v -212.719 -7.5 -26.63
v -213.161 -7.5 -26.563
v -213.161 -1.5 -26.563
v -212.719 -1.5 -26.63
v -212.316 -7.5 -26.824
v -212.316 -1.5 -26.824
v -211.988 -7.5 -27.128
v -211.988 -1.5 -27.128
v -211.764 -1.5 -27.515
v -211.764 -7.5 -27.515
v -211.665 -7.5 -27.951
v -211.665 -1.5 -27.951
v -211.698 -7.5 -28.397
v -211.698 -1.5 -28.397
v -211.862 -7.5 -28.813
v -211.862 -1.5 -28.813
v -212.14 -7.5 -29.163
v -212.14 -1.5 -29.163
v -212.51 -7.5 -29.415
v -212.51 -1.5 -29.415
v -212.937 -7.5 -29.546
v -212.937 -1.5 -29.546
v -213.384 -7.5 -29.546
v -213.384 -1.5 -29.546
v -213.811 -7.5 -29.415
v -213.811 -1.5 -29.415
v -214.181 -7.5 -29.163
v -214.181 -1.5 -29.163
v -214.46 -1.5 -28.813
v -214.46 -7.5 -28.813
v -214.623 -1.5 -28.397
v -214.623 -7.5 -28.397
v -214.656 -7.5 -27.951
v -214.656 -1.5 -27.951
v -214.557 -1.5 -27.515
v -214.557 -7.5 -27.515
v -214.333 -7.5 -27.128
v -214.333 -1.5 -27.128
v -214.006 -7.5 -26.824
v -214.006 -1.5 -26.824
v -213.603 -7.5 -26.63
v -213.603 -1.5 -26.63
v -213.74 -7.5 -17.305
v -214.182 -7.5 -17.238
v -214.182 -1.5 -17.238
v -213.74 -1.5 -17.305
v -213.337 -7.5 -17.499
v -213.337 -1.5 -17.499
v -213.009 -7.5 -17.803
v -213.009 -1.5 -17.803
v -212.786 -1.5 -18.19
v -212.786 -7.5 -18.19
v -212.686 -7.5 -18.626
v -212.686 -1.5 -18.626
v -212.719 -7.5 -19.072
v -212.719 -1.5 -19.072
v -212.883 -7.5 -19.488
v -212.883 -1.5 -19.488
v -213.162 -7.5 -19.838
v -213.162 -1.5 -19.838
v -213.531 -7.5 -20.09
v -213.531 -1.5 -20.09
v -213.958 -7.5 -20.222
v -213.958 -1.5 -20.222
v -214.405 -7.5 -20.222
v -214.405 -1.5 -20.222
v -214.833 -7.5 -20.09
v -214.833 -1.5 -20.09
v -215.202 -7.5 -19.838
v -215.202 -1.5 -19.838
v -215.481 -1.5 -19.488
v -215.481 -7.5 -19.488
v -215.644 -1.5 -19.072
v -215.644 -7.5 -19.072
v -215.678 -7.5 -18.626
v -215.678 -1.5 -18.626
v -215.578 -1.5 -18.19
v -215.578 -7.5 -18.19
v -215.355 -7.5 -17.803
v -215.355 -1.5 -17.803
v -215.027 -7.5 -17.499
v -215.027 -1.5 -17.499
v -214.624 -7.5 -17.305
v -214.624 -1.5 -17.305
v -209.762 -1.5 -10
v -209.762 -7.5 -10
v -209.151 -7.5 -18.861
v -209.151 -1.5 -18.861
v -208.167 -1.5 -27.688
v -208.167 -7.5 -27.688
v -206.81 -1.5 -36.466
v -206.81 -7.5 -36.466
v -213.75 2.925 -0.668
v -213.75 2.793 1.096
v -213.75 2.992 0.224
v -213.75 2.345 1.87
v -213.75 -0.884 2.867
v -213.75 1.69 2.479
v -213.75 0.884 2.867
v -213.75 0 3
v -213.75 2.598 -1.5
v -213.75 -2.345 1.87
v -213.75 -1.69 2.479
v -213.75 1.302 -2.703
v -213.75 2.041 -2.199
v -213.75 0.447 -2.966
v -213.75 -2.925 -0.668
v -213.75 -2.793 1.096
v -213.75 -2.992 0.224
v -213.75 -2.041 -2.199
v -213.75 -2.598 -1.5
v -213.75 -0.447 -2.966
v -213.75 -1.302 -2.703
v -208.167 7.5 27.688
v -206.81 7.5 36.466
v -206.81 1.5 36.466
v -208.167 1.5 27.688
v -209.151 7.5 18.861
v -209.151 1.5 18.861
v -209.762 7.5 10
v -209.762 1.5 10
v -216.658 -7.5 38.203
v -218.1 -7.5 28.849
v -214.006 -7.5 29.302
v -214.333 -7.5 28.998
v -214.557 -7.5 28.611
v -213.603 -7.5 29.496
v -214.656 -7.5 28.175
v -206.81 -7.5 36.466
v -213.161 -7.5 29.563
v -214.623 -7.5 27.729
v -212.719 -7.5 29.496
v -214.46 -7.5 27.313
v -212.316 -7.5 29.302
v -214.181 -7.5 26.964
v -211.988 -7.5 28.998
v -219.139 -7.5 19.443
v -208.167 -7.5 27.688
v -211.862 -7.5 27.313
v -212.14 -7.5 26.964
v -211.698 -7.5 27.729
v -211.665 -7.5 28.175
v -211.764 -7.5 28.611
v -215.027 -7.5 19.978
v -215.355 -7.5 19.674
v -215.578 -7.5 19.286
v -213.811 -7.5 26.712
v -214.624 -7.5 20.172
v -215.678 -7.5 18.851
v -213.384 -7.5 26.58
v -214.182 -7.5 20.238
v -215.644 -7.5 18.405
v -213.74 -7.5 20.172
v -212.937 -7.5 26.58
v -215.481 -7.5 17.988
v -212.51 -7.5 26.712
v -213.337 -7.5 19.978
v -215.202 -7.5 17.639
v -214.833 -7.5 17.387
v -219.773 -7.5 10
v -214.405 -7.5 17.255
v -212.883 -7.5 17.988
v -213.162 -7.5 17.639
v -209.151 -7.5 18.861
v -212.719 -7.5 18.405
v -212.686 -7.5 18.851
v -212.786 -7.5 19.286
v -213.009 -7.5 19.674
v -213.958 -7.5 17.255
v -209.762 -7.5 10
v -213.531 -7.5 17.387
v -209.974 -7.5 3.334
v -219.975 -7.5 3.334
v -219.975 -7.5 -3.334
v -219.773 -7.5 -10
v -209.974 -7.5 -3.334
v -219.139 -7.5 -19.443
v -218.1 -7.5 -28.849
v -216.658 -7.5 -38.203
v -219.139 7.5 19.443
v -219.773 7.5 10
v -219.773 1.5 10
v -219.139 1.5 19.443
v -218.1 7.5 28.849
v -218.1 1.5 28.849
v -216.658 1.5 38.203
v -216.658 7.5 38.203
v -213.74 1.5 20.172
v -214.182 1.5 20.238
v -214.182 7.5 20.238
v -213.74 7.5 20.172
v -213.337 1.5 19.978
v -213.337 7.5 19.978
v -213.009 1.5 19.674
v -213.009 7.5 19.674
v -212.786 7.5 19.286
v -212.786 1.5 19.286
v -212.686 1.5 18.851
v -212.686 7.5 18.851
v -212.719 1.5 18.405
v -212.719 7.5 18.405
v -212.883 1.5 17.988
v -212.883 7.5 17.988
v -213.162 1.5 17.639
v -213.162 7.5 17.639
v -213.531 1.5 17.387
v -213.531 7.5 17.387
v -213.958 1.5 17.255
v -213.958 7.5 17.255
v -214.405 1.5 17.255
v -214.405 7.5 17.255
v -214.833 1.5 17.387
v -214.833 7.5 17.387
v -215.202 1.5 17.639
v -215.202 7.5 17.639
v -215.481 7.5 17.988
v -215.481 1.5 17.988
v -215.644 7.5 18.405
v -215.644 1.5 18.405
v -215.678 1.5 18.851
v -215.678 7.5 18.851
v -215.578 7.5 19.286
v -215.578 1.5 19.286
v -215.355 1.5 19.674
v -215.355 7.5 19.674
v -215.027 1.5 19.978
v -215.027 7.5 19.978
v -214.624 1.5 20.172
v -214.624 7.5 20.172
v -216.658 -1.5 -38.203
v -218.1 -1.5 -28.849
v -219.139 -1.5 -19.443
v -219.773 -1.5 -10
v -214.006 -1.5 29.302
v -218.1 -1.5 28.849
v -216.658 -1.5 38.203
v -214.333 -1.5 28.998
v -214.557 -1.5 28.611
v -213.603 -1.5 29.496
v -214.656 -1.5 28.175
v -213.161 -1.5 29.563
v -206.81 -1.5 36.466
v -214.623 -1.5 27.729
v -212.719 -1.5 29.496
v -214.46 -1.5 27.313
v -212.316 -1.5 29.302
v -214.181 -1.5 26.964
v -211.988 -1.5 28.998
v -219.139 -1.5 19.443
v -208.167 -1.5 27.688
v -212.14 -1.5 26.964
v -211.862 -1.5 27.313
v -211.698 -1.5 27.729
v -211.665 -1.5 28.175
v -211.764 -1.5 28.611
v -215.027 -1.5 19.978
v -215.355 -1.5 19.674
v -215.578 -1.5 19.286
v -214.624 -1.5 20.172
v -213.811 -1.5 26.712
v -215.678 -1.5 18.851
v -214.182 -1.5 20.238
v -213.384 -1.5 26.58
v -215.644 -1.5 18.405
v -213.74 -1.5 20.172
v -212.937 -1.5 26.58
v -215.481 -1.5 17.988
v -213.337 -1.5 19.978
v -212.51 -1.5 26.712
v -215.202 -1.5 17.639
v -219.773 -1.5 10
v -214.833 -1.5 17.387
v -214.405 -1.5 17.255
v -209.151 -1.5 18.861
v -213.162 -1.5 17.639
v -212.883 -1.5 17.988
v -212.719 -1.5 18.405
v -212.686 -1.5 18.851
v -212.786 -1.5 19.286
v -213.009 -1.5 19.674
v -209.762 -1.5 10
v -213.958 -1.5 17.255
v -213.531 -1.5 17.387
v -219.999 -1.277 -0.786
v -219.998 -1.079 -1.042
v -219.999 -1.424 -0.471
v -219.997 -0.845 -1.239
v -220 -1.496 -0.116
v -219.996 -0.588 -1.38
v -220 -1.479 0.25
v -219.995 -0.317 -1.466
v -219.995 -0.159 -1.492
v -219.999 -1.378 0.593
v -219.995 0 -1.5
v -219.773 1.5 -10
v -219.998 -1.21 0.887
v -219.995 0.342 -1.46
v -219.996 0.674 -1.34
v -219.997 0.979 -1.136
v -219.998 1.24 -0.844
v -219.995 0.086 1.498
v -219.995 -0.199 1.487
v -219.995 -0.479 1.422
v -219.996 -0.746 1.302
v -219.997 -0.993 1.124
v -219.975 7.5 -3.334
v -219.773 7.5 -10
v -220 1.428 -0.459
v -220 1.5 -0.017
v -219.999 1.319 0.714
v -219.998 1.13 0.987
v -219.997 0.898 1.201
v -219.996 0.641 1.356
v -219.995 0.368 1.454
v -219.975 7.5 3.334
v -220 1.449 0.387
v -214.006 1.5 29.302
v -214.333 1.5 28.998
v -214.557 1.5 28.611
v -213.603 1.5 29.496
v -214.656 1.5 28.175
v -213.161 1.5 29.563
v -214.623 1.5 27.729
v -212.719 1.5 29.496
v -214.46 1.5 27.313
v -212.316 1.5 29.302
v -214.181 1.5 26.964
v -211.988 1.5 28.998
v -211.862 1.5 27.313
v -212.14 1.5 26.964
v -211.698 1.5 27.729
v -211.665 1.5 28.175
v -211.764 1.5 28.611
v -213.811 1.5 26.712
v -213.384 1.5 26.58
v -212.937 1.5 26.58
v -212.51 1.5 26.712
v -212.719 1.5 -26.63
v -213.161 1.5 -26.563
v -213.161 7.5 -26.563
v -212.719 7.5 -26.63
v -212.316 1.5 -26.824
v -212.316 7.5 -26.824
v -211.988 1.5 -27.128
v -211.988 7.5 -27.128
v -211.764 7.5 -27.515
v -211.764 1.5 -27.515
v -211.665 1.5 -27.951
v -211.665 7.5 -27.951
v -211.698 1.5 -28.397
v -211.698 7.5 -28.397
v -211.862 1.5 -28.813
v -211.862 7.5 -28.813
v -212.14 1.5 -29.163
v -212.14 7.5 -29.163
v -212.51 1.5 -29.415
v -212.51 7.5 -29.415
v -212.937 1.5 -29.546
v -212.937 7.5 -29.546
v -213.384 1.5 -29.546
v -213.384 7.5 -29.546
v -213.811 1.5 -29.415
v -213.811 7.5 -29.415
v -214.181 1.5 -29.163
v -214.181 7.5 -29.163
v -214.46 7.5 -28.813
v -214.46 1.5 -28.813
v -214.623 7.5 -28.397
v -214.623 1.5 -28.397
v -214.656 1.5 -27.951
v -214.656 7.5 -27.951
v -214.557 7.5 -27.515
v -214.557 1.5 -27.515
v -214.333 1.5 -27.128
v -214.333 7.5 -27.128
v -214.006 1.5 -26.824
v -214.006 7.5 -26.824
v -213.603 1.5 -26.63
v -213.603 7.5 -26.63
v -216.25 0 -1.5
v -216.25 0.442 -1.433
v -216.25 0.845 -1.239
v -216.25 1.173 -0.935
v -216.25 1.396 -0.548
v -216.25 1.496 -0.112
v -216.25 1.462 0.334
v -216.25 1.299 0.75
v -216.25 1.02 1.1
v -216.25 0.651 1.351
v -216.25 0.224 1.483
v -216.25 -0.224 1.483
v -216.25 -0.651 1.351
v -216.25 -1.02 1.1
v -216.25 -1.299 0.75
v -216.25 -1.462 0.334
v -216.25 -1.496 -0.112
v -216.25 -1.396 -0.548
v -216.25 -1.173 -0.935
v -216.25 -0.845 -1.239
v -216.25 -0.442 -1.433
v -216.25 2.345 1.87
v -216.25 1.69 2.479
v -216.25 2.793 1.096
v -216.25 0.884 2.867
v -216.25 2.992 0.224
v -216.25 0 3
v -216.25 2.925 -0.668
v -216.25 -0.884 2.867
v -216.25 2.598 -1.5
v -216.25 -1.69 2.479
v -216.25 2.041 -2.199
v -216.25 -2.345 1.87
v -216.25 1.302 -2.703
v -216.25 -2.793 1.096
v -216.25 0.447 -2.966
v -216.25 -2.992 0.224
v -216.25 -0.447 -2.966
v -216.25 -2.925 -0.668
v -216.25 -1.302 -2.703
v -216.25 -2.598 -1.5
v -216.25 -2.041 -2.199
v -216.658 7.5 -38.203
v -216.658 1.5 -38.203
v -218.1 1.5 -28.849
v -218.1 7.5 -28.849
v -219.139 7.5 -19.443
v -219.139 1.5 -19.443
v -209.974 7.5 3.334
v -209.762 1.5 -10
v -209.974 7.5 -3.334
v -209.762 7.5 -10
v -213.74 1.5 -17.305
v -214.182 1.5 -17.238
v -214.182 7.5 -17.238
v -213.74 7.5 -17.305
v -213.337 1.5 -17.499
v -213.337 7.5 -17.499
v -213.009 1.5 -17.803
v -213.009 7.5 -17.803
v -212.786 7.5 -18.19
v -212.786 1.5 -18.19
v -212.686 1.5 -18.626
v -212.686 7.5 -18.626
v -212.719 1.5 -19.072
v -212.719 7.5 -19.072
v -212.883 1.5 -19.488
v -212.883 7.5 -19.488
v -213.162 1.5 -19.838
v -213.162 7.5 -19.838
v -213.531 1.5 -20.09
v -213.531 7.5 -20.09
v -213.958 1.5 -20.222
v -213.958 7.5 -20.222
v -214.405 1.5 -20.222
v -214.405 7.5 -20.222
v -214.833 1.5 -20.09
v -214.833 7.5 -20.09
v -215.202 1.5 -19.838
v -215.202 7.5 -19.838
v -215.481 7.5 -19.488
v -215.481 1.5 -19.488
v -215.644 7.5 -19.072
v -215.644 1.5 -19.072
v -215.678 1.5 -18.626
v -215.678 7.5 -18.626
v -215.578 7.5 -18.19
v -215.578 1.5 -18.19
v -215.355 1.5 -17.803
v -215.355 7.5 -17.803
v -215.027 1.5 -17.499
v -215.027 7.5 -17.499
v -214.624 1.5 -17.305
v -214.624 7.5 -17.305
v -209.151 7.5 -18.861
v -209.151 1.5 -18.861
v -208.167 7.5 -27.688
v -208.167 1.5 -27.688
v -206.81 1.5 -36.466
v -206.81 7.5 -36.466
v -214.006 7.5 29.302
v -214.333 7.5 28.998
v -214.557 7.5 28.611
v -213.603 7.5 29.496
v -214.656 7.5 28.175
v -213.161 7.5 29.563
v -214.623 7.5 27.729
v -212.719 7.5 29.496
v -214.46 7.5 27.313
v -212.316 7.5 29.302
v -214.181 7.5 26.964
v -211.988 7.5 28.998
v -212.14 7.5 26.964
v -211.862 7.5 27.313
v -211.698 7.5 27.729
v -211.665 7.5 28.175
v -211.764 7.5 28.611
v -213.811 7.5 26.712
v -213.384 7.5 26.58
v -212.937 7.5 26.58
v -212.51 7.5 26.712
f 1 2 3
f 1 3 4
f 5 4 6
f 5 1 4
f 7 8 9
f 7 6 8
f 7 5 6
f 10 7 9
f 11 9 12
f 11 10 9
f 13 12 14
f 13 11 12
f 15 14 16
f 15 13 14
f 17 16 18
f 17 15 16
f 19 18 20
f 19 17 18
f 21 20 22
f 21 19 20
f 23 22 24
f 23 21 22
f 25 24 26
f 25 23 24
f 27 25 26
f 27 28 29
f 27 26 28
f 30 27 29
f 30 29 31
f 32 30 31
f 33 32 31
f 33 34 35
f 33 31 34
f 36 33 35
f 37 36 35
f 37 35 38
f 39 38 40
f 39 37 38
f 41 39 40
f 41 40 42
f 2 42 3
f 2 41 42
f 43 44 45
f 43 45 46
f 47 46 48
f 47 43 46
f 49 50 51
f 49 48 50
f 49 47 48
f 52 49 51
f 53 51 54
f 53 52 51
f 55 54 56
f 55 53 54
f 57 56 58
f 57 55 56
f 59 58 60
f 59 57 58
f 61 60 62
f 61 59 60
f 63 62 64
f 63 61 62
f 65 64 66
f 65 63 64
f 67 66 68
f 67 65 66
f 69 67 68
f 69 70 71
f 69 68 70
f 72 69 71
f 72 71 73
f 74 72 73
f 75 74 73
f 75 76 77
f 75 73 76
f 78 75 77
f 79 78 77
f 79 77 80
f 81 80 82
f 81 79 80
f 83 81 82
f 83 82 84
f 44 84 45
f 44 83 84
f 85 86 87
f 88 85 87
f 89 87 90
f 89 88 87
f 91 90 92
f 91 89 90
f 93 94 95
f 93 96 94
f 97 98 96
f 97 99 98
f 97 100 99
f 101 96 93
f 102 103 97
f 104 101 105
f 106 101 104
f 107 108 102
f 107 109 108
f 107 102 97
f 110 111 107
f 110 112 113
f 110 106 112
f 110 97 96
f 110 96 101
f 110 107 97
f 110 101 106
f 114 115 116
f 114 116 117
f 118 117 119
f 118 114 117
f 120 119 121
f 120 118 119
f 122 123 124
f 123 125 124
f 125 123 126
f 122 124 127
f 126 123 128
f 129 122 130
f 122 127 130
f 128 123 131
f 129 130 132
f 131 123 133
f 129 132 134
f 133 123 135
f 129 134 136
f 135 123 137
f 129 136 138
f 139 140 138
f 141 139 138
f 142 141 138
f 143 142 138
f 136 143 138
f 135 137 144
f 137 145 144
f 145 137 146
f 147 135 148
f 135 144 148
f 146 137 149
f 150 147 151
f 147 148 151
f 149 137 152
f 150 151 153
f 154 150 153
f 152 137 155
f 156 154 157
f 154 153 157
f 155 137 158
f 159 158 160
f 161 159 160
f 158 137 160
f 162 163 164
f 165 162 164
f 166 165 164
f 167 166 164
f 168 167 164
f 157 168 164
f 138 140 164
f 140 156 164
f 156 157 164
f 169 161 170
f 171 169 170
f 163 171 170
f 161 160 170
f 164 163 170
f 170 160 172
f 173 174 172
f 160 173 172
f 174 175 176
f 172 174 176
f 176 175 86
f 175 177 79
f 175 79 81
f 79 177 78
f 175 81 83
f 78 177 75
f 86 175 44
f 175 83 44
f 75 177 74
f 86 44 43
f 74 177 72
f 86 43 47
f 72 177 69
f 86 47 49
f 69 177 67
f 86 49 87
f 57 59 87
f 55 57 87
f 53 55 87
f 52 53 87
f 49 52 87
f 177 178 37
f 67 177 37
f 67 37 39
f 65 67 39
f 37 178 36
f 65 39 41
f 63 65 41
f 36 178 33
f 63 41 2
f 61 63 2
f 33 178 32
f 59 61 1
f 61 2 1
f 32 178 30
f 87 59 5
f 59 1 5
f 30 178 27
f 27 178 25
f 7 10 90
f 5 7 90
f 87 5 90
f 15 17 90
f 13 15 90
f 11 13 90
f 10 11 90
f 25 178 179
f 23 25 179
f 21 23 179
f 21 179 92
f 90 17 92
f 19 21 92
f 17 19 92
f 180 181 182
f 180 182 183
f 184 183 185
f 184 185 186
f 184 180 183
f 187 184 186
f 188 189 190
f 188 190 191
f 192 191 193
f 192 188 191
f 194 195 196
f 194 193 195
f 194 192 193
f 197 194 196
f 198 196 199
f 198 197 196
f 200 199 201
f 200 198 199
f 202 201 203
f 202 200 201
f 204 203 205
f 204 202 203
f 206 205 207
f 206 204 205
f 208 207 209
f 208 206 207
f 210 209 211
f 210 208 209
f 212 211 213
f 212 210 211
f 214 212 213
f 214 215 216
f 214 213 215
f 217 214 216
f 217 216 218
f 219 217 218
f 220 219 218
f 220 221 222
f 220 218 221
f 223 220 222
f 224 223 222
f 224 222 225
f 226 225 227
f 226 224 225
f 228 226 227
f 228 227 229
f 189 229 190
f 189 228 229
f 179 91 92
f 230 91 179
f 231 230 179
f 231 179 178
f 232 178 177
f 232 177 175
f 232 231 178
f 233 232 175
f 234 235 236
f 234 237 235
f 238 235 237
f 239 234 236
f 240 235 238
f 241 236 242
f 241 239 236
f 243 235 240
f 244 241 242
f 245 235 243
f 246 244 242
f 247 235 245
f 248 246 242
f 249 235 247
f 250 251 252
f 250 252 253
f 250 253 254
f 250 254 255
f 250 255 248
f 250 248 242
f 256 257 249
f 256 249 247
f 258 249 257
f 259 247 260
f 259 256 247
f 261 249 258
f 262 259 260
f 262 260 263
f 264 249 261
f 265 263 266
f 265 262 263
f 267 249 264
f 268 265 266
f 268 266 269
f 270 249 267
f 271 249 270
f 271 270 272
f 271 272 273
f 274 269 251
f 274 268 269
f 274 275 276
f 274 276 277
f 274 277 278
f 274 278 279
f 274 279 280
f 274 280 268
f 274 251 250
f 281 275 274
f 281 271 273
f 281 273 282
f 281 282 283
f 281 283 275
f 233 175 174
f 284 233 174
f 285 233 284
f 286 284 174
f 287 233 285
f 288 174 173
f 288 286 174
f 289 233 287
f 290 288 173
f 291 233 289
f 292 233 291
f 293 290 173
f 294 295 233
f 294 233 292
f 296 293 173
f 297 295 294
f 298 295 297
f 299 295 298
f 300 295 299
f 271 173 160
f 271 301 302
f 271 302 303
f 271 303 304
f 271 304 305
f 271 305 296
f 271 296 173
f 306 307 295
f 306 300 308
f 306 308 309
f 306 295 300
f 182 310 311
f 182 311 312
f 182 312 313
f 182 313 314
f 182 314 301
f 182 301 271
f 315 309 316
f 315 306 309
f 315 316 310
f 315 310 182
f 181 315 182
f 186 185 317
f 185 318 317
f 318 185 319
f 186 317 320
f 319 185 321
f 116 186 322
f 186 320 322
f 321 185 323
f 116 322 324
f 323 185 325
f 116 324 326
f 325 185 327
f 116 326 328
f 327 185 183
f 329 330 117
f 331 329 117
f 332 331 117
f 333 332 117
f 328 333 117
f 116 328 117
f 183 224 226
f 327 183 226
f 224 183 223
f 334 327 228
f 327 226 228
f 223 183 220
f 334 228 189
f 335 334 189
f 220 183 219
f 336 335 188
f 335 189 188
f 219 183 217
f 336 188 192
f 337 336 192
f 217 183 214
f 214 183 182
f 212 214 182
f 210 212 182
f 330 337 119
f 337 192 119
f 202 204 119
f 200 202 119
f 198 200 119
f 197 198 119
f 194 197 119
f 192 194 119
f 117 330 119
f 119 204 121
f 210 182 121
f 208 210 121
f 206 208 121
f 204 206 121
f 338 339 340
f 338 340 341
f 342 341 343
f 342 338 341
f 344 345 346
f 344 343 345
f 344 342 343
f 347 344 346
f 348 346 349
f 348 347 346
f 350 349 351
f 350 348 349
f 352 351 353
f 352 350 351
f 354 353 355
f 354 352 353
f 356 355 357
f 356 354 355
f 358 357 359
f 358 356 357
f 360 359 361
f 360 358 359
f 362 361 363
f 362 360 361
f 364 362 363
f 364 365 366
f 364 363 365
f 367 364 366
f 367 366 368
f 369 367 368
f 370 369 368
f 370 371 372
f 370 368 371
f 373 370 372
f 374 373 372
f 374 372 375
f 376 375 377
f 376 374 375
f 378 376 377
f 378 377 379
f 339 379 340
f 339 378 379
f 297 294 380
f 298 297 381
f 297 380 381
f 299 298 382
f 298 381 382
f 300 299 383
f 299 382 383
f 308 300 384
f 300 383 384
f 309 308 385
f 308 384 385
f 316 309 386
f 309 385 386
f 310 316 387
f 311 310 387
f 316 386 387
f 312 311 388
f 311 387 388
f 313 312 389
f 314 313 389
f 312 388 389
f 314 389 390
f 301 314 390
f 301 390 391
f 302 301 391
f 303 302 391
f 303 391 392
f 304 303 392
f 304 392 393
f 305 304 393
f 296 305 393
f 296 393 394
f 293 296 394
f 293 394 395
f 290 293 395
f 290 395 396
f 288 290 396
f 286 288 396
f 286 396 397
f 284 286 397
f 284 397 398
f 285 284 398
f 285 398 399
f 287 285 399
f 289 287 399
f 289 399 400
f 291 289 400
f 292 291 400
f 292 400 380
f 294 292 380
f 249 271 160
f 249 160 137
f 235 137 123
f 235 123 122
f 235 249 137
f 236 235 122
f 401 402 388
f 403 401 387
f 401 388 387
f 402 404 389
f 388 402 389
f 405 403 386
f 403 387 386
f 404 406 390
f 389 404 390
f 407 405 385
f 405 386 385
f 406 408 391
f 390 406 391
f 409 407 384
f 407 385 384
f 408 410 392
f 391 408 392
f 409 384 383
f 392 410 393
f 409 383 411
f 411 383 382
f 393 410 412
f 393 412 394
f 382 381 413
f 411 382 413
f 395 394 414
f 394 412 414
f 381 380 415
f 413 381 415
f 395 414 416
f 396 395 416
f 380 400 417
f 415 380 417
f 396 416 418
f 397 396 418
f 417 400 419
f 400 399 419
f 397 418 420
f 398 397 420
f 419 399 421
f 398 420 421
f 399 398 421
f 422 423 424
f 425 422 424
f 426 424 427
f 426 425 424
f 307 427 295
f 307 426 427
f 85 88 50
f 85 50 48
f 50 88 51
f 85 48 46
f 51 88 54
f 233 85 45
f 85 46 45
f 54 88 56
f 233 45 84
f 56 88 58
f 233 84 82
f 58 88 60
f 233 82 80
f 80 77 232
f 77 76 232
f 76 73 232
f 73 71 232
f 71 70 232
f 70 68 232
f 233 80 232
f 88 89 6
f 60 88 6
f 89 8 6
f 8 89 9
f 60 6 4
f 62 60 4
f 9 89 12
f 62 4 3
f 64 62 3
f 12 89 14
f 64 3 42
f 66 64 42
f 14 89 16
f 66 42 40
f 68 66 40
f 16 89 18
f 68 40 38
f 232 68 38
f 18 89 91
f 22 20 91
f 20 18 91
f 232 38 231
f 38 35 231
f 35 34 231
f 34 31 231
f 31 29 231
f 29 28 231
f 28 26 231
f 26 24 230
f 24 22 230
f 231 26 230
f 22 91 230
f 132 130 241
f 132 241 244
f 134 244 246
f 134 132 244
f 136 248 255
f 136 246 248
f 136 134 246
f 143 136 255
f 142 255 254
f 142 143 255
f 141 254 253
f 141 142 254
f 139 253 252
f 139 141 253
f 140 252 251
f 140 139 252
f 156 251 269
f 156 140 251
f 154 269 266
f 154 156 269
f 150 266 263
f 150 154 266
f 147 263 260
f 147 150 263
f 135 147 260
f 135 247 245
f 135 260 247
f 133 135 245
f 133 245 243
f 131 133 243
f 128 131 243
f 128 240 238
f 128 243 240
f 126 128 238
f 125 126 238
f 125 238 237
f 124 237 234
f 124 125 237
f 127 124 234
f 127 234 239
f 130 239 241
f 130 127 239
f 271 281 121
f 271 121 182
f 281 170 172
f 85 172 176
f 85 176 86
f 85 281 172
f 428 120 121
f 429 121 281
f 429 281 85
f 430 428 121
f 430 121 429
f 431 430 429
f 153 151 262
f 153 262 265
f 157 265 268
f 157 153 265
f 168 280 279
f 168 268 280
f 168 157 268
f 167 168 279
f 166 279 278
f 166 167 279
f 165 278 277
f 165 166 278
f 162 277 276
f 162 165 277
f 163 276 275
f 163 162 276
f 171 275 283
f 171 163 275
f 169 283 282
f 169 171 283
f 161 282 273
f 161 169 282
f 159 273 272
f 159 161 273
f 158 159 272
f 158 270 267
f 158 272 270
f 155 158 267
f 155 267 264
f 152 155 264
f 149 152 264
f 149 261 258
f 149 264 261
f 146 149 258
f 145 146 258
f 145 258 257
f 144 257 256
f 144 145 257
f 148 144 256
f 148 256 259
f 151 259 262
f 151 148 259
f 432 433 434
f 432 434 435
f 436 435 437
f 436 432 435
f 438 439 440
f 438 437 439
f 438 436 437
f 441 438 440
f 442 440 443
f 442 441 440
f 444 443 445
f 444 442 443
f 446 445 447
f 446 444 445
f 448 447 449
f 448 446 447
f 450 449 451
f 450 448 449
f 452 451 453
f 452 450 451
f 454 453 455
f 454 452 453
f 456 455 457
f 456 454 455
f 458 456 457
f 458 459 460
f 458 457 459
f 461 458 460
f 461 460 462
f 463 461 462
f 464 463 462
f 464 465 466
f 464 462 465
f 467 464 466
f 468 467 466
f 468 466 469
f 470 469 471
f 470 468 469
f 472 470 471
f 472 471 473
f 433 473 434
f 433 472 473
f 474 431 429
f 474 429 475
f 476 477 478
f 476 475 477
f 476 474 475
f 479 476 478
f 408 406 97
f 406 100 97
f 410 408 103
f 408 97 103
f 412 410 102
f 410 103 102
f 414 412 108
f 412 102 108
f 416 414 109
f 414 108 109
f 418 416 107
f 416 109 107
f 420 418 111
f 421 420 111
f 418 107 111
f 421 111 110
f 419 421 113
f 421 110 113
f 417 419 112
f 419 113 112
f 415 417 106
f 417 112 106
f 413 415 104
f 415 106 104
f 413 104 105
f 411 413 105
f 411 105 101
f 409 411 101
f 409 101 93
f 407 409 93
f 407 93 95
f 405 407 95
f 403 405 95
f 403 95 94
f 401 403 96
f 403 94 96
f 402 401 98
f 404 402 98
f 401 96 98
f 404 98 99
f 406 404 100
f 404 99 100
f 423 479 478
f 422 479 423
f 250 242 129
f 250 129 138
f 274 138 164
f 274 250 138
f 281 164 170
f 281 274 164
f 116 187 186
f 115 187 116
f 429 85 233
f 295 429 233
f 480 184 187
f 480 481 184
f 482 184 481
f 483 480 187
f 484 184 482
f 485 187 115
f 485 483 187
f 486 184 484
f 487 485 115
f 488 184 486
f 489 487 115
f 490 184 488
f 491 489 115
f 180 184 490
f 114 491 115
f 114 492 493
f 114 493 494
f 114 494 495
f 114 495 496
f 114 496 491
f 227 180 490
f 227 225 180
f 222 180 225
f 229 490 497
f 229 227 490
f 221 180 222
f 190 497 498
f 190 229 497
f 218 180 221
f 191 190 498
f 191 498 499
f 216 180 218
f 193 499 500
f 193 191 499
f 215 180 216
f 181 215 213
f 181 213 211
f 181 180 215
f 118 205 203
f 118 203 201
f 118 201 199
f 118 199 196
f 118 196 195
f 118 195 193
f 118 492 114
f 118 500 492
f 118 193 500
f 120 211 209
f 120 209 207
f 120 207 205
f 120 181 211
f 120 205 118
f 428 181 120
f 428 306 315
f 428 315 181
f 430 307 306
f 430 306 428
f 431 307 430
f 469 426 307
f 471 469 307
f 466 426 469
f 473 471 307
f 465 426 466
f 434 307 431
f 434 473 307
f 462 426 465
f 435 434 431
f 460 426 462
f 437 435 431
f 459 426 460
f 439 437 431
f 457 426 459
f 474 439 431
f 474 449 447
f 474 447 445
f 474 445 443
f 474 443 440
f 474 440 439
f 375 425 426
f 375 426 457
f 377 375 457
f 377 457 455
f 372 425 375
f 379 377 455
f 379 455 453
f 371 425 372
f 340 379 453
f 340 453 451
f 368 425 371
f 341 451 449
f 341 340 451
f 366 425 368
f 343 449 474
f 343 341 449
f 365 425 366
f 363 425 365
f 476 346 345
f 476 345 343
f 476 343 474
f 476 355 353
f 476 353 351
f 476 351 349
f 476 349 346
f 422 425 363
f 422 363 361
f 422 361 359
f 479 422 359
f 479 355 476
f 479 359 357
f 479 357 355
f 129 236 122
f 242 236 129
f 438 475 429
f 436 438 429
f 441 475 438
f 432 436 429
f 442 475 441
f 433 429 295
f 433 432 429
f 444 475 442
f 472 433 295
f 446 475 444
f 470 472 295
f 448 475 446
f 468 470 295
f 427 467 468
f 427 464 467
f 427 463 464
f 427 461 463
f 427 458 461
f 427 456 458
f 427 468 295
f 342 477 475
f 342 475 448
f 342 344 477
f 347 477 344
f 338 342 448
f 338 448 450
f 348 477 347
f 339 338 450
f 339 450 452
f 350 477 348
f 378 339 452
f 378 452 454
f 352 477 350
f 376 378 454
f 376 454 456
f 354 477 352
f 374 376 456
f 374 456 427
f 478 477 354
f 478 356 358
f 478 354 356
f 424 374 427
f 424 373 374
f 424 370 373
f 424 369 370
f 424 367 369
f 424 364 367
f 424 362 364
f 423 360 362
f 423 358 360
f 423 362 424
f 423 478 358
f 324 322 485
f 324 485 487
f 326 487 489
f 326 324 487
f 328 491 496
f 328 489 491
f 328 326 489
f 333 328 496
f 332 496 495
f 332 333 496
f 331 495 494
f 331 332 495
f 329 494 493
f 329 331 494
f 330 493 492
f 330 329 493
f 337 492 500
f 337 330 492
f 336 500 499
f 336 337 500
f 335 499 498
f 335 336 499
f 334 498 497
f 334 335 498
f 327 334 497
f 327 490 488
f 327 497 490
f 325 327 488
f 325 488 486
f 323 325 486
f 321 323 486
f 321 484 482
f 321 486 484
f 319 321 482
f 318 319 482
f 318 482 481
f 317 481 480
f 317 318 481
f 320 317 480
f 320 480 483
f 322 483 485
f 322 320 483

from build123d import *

# Parameters (mm, degrees)
BASE2_DEPTH            = 7.5
MOUNT2_START           = -1.5
MOUNT2_DEPTH           = 3
MOUNT_HOLE2_DEPTH      = 224.418192135
MOUNT_HOLE2_DEPTH_BACK = 224.418192135
SKETCH16_R             = 1.5
SKETCH18_W             = 2.5
SKETCH18_H             = 3
SKETCH19_R             = 1.5
CUT_EXTRUDE10_DEPTH    = 40.784051683


with BuildPart() as part:
    # Sketch13 → base2 (new, symmetric)
    with BuildSketch(Plane(origin=(0, 0, 0), x_dir=(1, 0, 0), z_dir=(0, 1, 0))):
        with BuildLine():
            ThreePointArc((-209.761769634, 10), (-208.70564487, 23.279901188), (-206.809628133, 36.46611731))
            Line((-206.809628133, 36.46611731), (-216.657705663, 38.202599087))
            ThreePointArc((-216.657705663, 38.202599087), (-218.670303662, 24.151569236), (-219.772609758, 10))
            Line((-219.772609758, 10), (-209.761769634, 10))
        make_face()
        with BuildLine():
            ThreePointArc((-209.761769634, -10), (-210, 0), (-209.761769634, 10))
            Line((-209.761769634, 10), (-219.772609758, 10))
            ThreePointArc((-219.772609758, 10), (-220, 0), (-219.772609758, -10))
            Line((-219.772609758, -10), (-209.761769634, -10))
        make_face()
        with BuildLine():
            Line((-216.657705663, -38.202599087), (-206.809628133, -36.46611731))
            ThreePointArc((-206.809628133, -36.46611731), (-208.70564487, -23.279901188), (-209.761769634, -10))
            Line((-209.761769634, -10), (-219.772609758, -10))
            ThreePointArc((-219.772609758, -10), (-218.670303662, -24.151569236), (-216.657705663, -38.202599087))
        make_face()
    extrude(amount=BASE2_DEPTH, both=True)

    # Sketch14 → mount2 (cut)
    with BuildSketch(Plane(origin=(0, 0, 0), x_dir=(1, 0, 0), z_dir=(0, 1, 0)).offset(MOUNT2_START)):
        with BuildLine():
            Line((-209.761769634, -10), (-219.772609758, -10))
            ThreePointArc((-219.772609758, -10), (-218.670303662, -24.151569236), (-216.657705663, -38.202599087))
            Line((-216.657705663, -38.202599087), (-206.809628133, -36.46611731))
            ThreePointArc((-206.809628133, -36.46611731), (-208.70564487, -23.279901188), (-209.761769634, -10))
        make_face()
        with BuildLine():
            Line((-209.761769634, 10), (-219.772609758, 10))
            ThreePointArc((-219.772609758, 10), (-218.670303662, 24.151569236), (-216.657705663, 38.202599087))
            Line((-216.657705663, 38.202599087), (-206.809628133, 36.46611731))
            ThreePointArc((-206.809628133, 36.46611731), (-208.70564487, 23.279901188), (-209.761769634, 10))
        make_face()
    extrude(amount=MOUNT2_DEPTH, mode=Mode.SUBTRACT)

    # Sketch16 → mount hole2 (cut, two sides: drawn at the far end of the back side and taken through both)
    with BuildSketch(Plane(origin=(0, 0, 0), x_dir=(1, 0, 0), z_dir=(0, 1, 0)).offset(-MOUNT_HOLE2_DEPTH_BACK)):
        with Locations(Location((-213.160645195, 28.063131327, 0), (0, 0, 270))):
            Circle(SKETCH16_R)
        with Locations(Location((-214.18186009, 18.738484691, 0), (0, 0, 270))):
            Circle(SKETCH16_R)
        with Locations(Location((-214.18186009, -18.738484691, 0), (0, 0, 270))):
            Circle(SKETCH16_R)
        with Locations(Location((-213.160645195, -28.063131327, 0), (0, 0, 270))):
            Circle(SKETCH16_R)
    extrude(amount=MOUNT_HOLE2_DEPTH + MOUNT_HOLE2_DEPTH_BACK, mode=Mode.SUBTRACT)

    # Sketch18 → bearing (revolve, cut)
    with BuildSketch(Plane(origin=(0, 0, 0), x_dir=(1, 0, 0), z_dir=(0, 1, 0)), mode=Mode.PRIVATE) as bearing_sk:
        with Locations((-215, 1.5)):
            Rectangle(SKETCH18_W, SKETCH18_H)
    revolve(bearing_sk.sketch.rotate(Axis((-215, 0, 0), (1, 0, 0)), 180), axis=Axis((-215, 0, 0), (1, 0, 0)), mode=Mode.SUBTRACT)

    # Sketch19 → Cut-Extrude10 (cut, through all)
    with BuildSketch(Plane(origin=(-215, 0, 0), x_dir=(0, 0, -1), z_dir=(1, 0, 0))):
        Circle(SKETCH19_R)
    extrude(amount=-CUT_EXTRUDE10_DEPTH, mode=Mode.SUBTRACT)


solid = part.part
